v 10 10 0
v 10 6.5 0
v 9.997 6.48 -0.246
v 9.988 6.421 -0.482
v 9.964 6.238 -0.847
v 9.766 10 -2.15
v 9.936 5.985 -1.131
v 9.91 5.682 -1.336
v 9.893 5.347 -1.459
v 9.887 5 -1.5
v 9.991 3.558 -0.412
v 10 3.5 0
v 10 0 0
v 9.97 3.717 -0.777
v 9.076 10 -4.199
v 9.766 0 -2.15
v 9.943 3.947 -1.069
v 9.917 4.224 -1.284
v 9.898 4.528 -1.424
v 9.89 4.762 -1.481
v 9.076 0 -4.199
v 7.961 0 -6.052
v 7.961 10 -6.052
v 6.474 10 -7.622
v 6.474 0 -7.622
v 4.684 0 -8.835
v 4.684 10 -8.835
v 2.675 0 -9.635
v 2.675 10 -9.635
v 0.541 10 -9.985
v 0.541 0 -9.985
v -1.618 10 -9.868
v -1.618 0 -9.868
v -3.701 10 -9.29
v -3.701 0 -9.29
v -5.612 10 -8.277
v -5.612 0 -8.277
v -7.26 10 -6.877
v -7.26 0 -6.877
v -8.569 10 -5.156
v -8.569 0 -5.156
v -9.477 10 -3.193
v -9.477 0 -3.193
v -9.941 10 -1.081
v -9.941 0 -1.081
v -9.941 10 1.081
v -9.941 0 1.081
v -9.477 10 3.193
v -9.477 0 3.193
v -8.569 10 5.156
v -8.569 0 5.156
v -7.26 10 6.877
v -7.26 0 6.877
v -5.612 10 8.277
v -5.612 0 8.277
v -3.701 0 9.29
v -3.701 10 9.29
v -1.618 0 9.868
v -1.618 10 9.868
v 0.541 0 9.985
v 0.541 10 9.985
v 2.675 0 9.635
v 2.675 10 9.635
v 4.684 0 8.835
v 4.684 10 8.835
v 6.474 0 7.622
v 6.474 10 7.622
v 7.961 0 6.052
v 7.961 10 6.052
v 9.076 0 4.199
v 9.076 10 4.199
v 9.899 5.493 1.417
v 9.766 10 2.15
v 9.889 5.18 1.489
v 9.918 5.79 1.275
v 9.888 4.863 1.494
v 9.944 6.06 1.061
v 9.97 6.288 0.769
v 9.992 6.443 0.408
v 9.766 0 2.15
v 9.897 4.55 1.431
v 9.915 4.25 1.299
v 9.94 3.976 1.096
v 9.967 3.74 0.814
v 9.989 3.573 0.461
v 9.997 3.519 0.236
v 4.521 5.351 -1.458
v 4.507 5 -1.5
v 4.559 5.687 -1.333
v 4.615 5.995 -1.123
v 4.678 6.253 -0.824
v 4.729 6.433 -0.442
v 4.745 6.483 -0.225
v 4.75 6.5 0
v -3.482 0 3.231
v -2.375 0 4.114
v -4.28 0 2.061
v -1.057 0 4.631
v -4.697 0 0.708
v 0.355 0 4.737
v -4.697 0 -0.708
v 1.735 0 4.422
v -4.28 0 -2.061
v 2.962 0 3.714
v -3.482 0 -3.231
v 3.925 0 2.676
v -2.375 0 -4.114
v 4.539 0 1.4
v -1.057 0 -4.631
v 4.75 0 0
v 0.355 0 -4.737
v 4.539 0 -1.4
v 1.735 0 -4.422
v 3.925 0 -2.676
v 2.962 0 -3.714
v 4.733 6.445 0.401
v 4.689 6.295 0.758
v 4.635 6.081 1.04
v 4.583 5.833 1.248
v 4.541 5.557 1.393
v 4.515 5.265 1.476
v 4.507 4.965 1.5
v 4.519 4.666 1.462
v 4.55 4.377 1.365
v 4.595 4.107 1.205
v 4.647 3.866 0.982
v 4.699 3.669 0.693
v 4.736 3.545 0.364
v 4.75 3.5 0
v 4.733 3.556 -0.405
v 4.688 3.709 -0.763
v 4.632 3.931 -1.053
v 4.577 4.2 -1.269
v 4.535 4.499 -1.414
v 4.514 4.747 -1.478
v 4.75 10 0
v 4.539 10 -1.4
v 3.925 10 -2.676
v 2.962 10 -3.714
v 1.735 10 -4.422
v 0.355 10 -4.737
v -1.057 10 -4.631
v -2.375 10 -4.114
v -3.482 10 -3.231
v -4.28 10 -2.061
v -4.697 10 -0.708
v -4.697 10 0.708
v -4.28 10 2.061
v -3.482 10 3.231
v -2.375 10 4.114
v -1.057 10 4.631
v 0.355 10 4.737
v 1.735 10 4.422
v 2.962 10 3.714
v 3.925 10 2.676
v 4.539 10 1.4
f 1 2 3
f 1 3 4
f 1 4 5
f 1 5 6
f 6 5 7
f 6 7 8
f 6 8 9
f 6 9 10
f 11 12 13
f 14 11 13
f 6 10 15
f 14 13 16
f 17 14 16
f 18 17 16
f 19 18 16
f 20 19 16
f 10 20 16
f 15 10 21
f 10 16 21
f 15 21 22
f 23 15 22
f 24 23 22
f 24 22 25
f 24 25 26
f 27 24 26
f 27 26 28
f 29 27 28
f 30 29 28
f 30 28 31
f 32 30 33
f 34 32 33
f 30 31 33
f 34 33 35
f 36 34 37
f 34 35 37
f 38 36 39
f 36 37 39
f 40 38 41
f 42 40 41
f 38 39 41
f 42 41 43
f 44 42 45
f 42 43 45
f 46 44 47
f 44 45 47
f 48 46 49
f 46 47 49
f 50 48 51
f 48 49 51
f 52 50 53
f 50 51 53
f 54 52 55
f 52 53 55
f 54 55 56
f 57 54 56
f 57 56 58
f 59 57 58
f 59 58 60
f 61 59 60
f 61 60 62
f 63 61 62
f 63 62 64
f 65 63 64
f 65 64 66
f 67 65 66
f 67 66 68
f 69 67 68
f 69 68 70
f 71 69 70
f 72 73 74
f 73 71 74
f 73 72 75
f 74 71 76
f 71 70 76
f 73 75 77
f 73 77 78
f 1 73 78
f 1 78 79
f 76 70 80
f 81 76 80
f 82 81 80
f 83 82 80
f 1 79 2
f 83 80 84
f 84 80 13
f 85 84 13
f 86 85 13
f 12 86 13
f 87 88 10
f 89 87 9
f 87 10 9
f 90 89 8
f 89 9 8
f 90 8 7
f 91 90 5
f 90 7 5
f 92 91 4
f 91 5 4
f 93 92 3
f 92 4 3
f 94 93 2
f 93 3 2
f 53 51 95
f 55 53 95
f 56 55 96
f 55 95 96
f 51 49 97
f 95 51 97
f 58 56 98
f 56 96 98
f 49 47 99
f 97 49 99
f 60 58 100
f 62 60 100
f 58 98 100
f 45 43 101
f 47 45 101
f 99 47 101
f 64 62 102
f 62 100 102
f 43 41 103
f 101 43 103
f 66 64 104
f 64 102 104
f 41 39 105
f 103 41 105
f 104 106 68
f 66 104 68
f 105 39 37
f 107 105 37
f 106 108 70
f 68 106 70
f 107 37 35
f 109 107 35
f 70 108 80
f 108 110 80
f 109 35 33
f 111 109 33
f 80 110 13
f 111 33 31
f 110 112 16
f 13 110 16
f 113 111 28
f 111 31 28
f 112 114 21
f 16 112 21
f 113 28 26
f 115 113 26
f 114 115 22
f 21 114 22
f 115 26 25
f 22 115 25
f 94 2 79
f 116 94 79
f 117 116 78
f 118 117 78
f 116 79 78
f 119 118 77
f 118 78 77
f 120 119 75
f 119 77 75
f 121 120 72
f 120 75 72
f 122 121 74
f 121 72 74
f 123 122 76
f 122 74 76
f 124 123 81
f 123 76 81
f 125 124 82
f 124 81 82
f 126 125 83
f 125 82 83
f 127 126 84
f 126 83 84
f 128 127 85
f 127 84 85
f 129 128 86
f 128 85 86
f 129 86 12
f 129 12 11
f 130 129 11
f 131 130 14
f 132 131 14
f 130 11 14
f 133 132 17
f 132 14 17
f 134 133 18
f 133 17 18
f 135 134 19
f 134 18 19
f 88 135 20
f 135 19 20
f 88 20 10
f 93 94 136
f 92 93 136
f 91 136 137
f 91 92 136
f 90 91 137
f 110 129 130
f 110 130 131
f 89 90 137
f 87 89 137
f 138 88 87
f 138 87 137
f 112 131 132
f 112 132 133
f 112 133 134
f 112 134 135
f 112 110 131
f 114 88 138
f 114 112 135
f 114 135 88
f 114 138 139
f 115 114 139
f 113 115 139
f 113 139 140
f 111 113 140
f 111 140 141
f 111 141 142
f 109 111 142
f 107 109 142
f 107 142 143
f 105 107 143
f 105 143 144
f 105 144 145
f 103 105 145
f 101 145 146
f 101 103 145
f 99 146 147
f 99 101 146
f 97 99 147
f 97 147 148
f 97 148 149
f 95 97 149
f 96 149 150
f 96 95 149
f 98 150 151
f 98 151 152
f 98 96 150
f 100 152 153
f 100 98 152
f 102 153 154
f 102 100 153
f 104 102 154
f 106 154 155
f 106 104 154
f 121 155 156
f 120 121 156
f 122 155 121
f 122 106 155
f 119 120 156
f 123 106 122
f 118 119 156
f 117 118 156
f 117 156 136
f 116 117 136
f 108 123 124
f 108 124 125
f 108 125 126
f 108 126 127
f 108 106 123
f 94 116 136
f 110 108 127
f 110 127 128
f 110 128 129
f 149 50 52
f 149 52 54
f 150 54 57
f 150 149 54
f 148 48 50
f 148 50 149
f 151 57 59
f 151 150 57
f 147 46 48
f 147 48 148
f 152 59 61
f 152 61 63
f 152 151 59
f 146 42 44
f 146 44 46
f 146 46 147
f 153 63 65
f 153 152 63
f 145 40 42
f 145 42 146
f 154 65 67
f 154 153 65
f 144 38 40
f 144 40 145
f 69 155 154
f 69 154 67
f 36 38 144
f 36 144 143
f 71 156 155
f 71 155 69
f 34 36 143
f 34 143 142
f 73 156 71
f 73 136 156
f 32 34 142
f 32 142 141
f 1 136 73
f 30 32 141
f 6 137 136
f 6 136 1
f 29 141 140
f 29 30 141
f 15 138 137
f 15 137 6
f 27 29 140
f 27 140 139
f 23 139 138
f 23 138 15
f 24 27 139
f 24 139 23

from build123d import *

# Parameters (mm, degrees)
SKETCH1_R           = 10
SKETCH1_R_2         = 4.75
BOSS_EXTRUDE1_DEPTH = 10
CUT_EXTRUDE1_DEPTH  = 10


with BuildPart() as part:
    # Sketch1 → Boss-Extrude1 (new body)
    with BuildSketch(Plane(origin=(0, 0, 0), x_dir=(1, 0, 0), z_dir=(0, 1, 0))):
        Circle(SKETCH1_R)
        Circle(SKETCH1_R_2, mode=Mode.SUBTRACT)
    extrude(amount=BOSS_EXTRUDE1_DEPTH)

    # Sketch2 → Cut-Extrude1 (cut)
    with BuildSketch(Plane(origin=(10, 0, 0), x_dir=(0, 0, -1), z_dir=(1, 0, 0))):
        with BuildLine():
            ThreePointArc((0, 6.5), (-1.5, 5), (0, 3.5))
            Line((0, 3.5), (0, 6.5))
        make_face()
        with BuildLine():
            Line((0, 6.5), (0, 3.5))
            ThreePointArc((0, 3.5), (1.060660172, 3.939339828), (1.5, 5))
            ThreePointArc((1.5, 5), (1.060660172, 6.060660172), (0, 6.5))
        make_face()
    extrude(amount=-CUT_EXTRUDE1_DEPTH, mode=Mode.SUBTRACT)


solid = part.part
